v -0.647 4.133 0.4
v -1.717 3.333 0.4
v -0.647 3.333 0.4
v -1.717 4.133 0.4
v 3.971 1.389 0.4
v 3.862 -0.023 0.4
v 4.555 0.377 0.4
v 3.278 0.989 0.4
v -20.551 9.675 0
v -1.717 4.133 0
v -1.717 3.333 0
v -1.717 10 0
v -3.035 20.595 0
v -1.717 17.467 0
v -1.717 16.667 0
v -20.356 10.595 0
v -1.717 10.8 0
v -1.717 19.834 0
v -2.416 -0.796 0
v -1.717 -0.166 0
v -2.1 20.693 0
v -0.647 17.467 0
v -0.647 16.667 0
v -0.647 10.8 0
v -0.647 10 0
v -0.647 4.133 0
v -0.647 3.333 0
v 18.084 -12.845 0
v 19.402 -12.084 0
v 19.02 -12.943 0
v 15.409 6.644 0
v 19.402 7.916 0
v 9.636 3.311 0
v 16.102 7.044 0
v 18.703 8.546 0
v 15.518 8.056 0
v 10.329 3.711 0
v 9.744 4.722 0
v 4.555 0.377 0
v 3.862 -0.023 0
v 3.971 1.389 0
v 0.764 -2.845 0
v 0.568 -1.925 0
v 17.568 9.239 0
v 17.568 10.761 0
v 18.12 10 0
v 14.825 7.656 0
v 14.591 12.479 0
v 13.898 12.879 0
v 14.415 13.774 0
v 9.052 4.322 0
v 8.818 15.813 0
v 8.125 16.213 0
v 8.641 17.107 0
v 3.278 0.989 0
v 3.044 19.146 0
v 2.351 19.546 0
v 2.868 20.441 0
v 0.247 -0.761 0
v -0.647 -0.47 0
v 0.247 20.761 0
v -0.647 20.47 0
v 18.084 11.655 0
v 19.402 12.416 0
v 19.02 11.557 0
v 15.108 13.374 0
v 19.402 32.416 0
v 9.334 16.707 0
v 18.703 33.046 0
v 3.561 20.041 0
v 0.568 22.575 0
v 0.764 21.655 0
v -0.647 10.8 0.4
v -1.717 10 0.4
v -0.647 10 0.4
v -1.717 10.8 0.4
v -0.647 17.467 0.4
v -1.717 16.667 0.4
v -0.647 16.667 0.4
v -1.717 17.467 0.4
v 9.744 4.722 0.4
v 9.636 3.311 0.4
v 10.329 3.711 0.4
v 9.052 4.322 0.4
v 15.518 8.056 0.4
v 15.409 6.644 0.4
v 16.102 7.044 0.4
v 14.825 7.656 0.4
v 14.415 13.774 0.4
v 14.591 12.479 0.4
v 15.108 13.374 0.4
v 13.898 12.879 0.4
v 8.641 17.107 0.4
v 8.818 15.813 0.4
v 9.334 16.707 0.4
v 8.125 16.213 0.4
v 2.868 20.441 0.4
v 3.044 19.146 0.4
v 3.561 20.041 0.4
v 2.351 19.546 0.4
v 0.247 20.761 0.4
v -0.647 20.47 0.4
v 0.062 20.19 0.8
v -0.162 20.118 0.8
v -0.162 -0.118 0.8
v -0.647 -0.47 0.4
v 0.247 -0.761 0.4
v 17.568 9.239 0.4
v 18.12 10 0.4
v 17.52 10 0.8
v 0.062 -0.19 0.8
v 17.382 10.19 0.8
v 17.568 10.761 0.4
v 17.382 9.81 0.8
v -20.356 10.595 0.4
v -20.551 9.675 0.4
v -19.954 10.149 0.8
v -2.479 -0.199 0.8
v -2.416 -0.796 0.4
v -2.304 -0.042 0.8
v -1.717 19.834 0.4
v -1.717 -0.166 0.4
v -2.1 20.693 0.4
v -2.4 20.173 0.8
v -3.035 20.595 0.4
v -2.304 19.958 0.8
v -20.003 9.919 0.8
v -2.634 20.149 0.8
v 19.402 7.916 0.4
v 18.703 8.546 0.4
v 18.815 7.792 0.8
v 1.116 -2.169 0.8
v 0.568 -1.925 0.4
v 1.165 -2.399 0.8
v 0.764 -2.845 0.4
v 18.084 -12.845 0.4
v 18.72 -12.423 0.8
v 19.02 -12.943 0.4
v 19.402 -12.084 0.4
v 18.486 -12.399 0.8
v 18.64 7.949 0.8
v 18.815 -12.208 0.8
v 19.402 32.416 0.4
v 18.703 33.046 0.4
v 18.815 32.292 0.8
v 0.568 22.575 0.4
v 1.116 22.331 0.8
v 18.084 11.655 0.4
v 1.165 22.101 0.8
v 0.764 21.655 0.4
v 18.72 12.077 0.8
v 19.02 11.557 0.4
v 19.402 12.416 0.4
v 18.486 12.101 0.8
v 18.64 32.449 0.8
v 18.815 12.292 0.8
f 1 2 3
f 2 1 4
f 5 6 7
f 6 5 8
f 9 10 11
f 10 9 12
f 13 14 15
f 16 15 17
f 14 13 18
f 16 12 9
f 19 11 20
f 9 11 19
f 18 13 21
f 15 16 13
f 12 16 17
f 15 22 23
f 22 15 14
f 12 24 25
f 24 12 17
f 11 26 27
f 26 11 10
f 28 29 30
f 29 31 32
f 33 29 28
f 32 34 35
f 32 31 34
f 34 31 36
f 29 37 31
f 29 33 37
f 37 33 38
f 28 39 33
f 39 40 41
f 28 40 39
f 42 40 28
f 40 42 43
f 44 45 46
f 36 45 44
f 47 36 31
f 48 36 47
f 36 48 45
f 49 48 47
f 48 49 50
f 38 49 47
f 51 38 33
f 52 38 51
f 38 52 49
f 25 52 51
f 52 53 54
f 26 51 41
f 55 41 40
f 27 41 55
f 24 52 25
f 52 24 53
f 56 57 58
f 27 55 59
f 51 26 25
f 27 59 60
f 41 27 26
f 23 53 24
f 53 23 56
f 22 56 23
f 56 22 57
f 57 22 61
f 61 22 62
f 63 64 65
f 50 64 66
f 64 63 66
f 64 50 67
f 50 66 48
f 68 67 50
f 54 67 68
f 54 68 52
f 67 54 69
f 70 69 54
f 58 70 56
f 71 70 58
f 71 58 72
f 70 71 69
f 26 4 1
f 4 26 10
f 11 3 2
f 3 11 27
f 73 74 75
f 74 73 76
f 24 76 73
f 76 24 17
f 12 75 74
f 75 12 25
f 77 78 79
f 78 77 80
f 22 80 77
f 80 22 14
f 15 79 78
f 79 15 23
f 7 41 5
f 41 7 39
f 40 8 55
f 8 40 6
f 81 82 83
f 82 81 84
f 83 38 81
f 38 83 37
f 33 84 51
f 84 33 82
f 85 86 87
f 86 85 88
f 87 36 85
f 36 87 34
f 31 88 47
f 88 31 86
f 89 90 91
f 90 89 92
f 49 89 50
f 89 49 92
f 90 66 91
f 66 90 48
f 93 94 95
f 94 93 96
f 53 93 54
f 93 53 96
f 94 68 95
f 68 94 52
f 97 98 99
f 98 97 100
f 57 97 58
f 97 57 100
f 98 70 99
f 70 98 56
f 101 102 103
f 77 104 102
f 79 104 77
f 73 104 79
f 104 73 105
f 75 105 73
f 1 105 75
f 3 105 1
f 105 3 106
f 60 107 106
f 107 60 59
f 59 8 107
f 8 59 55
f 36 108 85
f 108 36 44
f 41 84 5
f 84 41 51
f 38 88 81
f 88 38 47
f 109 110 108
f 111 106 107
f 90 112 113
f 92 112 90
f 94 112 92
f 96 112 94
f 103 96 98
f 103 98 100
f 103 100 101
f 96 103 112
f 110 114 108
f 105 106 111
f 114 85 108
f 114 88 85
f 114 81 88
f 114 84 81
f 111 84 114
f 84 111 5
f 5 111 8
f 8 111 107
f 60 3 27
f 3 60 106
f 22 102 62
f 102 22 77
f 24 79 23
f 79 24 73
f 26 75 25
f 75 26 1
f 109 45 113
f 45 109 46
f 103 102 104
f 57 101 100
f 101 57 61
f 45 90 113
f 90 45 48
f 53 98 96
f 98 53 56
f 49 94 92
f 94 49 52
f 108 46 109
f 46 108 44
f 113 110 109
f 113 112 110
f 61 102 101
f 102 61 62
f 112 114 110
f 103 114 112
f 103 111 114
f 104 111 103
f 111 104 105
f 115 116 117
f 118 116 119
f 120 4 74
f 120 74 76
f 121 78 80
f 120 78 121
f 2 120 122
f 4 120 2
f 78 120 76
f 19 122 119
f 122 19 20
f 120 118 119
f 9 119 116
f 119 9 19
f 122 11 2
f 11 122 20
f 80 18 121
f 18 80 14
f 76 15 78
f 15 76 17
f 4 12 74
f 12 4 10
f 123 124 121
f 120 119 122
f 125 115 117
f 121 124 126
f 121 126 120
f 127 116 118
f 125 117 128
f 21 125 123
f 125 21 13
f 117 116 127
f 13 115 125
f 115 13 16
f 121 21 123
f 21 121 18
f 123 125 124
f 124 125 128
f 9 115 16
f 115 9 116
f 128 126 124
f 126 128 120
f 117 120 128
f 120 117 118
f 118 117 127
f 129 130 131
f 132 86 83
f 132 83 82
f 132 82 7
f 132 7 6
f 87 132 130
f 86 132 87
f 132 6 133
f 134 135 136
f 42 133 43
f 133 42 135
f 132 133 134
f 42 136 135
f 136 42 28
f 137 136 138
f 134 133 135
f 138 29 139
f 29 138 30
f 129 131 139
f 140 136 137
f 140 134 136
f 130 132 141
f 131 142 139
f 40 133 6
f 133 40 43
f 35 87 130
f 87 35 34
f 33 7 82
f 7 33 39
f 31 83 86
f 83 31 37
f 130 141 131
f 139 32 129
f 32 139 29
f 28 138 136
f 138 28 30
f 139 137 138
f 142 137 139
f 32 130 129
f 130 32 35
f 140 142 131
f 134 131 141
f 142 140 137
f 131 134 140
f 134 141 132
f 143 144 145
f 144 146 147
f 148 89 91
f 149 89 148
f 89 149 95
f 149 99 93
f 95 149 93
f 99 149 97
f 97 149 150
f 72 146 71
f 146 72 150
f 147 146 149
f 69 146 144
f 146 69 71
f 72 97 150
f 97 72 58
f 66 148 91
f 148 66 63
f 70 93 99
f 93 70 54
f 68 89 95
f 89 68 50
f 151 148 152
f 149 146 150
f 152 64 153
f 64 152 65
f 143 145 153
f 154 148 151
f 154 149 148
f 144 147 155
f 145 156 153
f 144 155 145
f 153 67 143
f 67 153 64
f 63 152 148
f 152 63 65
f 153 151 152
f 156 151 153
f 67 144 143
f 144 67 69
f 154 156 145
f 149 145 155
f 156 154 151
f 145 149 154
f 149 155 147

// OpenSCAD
gSide = 20;
gSpacingConnect=3;
gWallThickness = 0.4;
gJoinerThickness = 0.4;

//joiners();
//triangle();
//cylinder(gWallThickness,gWallThickness,1,center);
main();

module main()
{
    triangle();
    joiners();
    rotate([0,0,-60]) joiners();
    //rotate([0,0,-60]) joiners();
    //translate([0,-gSpacingConnect,0]) rotate([0,0,-60]) joiners();
    //translate([-gSpacingConnect+gSide,gSide/2,0])
    translate([gSide-gSpacingConnect/2,gSide+gSpacingConnect/2-gSide/3-(gSpacingConnect*1.5)/2,0]) rotate([0,0,60]) joiners();
//        
    translate([-gSpacingConnect/1.2,0,0])rotate([0,0,60]) triangle();
    translate([0,-gSpacingConnect,0]) rotate([0,0,-60]) translate([0, gSpacingConnect/2,0]) triangle();
    translate([0,gSide+gSpacingConnect/2,0]) rotate([0,0,-60]) translate([0, gSpacingConnect/2,0]) triangle();
}

module triangle()
{
    minkowski()
    {
    linear_extrude(height = gWallThickness, center = false){
        polygon([[0,0], [0,gSide], [pow((pow(gSide,2) - (pow(gSide/2,2))),1/2),gSide/2], [0,0]]);
    }
    cylinder(gWallThickness,gWallThickness*2,0.2);
    
    }
}


module joiners()
{
    translate([-gSpacingConnect*1.5/2,0,0])
    for (i = [gSide/6:gSide/3:gSide-gSide/6]) 
    {
        translate([0,i,0]) joiner();
    }
    
}

module joiner()
{
   cube([gSpacingConnect*1.5,gJoinerThickness*2,gJoinerThickness],0); 
}

//cube(20,20,20);
